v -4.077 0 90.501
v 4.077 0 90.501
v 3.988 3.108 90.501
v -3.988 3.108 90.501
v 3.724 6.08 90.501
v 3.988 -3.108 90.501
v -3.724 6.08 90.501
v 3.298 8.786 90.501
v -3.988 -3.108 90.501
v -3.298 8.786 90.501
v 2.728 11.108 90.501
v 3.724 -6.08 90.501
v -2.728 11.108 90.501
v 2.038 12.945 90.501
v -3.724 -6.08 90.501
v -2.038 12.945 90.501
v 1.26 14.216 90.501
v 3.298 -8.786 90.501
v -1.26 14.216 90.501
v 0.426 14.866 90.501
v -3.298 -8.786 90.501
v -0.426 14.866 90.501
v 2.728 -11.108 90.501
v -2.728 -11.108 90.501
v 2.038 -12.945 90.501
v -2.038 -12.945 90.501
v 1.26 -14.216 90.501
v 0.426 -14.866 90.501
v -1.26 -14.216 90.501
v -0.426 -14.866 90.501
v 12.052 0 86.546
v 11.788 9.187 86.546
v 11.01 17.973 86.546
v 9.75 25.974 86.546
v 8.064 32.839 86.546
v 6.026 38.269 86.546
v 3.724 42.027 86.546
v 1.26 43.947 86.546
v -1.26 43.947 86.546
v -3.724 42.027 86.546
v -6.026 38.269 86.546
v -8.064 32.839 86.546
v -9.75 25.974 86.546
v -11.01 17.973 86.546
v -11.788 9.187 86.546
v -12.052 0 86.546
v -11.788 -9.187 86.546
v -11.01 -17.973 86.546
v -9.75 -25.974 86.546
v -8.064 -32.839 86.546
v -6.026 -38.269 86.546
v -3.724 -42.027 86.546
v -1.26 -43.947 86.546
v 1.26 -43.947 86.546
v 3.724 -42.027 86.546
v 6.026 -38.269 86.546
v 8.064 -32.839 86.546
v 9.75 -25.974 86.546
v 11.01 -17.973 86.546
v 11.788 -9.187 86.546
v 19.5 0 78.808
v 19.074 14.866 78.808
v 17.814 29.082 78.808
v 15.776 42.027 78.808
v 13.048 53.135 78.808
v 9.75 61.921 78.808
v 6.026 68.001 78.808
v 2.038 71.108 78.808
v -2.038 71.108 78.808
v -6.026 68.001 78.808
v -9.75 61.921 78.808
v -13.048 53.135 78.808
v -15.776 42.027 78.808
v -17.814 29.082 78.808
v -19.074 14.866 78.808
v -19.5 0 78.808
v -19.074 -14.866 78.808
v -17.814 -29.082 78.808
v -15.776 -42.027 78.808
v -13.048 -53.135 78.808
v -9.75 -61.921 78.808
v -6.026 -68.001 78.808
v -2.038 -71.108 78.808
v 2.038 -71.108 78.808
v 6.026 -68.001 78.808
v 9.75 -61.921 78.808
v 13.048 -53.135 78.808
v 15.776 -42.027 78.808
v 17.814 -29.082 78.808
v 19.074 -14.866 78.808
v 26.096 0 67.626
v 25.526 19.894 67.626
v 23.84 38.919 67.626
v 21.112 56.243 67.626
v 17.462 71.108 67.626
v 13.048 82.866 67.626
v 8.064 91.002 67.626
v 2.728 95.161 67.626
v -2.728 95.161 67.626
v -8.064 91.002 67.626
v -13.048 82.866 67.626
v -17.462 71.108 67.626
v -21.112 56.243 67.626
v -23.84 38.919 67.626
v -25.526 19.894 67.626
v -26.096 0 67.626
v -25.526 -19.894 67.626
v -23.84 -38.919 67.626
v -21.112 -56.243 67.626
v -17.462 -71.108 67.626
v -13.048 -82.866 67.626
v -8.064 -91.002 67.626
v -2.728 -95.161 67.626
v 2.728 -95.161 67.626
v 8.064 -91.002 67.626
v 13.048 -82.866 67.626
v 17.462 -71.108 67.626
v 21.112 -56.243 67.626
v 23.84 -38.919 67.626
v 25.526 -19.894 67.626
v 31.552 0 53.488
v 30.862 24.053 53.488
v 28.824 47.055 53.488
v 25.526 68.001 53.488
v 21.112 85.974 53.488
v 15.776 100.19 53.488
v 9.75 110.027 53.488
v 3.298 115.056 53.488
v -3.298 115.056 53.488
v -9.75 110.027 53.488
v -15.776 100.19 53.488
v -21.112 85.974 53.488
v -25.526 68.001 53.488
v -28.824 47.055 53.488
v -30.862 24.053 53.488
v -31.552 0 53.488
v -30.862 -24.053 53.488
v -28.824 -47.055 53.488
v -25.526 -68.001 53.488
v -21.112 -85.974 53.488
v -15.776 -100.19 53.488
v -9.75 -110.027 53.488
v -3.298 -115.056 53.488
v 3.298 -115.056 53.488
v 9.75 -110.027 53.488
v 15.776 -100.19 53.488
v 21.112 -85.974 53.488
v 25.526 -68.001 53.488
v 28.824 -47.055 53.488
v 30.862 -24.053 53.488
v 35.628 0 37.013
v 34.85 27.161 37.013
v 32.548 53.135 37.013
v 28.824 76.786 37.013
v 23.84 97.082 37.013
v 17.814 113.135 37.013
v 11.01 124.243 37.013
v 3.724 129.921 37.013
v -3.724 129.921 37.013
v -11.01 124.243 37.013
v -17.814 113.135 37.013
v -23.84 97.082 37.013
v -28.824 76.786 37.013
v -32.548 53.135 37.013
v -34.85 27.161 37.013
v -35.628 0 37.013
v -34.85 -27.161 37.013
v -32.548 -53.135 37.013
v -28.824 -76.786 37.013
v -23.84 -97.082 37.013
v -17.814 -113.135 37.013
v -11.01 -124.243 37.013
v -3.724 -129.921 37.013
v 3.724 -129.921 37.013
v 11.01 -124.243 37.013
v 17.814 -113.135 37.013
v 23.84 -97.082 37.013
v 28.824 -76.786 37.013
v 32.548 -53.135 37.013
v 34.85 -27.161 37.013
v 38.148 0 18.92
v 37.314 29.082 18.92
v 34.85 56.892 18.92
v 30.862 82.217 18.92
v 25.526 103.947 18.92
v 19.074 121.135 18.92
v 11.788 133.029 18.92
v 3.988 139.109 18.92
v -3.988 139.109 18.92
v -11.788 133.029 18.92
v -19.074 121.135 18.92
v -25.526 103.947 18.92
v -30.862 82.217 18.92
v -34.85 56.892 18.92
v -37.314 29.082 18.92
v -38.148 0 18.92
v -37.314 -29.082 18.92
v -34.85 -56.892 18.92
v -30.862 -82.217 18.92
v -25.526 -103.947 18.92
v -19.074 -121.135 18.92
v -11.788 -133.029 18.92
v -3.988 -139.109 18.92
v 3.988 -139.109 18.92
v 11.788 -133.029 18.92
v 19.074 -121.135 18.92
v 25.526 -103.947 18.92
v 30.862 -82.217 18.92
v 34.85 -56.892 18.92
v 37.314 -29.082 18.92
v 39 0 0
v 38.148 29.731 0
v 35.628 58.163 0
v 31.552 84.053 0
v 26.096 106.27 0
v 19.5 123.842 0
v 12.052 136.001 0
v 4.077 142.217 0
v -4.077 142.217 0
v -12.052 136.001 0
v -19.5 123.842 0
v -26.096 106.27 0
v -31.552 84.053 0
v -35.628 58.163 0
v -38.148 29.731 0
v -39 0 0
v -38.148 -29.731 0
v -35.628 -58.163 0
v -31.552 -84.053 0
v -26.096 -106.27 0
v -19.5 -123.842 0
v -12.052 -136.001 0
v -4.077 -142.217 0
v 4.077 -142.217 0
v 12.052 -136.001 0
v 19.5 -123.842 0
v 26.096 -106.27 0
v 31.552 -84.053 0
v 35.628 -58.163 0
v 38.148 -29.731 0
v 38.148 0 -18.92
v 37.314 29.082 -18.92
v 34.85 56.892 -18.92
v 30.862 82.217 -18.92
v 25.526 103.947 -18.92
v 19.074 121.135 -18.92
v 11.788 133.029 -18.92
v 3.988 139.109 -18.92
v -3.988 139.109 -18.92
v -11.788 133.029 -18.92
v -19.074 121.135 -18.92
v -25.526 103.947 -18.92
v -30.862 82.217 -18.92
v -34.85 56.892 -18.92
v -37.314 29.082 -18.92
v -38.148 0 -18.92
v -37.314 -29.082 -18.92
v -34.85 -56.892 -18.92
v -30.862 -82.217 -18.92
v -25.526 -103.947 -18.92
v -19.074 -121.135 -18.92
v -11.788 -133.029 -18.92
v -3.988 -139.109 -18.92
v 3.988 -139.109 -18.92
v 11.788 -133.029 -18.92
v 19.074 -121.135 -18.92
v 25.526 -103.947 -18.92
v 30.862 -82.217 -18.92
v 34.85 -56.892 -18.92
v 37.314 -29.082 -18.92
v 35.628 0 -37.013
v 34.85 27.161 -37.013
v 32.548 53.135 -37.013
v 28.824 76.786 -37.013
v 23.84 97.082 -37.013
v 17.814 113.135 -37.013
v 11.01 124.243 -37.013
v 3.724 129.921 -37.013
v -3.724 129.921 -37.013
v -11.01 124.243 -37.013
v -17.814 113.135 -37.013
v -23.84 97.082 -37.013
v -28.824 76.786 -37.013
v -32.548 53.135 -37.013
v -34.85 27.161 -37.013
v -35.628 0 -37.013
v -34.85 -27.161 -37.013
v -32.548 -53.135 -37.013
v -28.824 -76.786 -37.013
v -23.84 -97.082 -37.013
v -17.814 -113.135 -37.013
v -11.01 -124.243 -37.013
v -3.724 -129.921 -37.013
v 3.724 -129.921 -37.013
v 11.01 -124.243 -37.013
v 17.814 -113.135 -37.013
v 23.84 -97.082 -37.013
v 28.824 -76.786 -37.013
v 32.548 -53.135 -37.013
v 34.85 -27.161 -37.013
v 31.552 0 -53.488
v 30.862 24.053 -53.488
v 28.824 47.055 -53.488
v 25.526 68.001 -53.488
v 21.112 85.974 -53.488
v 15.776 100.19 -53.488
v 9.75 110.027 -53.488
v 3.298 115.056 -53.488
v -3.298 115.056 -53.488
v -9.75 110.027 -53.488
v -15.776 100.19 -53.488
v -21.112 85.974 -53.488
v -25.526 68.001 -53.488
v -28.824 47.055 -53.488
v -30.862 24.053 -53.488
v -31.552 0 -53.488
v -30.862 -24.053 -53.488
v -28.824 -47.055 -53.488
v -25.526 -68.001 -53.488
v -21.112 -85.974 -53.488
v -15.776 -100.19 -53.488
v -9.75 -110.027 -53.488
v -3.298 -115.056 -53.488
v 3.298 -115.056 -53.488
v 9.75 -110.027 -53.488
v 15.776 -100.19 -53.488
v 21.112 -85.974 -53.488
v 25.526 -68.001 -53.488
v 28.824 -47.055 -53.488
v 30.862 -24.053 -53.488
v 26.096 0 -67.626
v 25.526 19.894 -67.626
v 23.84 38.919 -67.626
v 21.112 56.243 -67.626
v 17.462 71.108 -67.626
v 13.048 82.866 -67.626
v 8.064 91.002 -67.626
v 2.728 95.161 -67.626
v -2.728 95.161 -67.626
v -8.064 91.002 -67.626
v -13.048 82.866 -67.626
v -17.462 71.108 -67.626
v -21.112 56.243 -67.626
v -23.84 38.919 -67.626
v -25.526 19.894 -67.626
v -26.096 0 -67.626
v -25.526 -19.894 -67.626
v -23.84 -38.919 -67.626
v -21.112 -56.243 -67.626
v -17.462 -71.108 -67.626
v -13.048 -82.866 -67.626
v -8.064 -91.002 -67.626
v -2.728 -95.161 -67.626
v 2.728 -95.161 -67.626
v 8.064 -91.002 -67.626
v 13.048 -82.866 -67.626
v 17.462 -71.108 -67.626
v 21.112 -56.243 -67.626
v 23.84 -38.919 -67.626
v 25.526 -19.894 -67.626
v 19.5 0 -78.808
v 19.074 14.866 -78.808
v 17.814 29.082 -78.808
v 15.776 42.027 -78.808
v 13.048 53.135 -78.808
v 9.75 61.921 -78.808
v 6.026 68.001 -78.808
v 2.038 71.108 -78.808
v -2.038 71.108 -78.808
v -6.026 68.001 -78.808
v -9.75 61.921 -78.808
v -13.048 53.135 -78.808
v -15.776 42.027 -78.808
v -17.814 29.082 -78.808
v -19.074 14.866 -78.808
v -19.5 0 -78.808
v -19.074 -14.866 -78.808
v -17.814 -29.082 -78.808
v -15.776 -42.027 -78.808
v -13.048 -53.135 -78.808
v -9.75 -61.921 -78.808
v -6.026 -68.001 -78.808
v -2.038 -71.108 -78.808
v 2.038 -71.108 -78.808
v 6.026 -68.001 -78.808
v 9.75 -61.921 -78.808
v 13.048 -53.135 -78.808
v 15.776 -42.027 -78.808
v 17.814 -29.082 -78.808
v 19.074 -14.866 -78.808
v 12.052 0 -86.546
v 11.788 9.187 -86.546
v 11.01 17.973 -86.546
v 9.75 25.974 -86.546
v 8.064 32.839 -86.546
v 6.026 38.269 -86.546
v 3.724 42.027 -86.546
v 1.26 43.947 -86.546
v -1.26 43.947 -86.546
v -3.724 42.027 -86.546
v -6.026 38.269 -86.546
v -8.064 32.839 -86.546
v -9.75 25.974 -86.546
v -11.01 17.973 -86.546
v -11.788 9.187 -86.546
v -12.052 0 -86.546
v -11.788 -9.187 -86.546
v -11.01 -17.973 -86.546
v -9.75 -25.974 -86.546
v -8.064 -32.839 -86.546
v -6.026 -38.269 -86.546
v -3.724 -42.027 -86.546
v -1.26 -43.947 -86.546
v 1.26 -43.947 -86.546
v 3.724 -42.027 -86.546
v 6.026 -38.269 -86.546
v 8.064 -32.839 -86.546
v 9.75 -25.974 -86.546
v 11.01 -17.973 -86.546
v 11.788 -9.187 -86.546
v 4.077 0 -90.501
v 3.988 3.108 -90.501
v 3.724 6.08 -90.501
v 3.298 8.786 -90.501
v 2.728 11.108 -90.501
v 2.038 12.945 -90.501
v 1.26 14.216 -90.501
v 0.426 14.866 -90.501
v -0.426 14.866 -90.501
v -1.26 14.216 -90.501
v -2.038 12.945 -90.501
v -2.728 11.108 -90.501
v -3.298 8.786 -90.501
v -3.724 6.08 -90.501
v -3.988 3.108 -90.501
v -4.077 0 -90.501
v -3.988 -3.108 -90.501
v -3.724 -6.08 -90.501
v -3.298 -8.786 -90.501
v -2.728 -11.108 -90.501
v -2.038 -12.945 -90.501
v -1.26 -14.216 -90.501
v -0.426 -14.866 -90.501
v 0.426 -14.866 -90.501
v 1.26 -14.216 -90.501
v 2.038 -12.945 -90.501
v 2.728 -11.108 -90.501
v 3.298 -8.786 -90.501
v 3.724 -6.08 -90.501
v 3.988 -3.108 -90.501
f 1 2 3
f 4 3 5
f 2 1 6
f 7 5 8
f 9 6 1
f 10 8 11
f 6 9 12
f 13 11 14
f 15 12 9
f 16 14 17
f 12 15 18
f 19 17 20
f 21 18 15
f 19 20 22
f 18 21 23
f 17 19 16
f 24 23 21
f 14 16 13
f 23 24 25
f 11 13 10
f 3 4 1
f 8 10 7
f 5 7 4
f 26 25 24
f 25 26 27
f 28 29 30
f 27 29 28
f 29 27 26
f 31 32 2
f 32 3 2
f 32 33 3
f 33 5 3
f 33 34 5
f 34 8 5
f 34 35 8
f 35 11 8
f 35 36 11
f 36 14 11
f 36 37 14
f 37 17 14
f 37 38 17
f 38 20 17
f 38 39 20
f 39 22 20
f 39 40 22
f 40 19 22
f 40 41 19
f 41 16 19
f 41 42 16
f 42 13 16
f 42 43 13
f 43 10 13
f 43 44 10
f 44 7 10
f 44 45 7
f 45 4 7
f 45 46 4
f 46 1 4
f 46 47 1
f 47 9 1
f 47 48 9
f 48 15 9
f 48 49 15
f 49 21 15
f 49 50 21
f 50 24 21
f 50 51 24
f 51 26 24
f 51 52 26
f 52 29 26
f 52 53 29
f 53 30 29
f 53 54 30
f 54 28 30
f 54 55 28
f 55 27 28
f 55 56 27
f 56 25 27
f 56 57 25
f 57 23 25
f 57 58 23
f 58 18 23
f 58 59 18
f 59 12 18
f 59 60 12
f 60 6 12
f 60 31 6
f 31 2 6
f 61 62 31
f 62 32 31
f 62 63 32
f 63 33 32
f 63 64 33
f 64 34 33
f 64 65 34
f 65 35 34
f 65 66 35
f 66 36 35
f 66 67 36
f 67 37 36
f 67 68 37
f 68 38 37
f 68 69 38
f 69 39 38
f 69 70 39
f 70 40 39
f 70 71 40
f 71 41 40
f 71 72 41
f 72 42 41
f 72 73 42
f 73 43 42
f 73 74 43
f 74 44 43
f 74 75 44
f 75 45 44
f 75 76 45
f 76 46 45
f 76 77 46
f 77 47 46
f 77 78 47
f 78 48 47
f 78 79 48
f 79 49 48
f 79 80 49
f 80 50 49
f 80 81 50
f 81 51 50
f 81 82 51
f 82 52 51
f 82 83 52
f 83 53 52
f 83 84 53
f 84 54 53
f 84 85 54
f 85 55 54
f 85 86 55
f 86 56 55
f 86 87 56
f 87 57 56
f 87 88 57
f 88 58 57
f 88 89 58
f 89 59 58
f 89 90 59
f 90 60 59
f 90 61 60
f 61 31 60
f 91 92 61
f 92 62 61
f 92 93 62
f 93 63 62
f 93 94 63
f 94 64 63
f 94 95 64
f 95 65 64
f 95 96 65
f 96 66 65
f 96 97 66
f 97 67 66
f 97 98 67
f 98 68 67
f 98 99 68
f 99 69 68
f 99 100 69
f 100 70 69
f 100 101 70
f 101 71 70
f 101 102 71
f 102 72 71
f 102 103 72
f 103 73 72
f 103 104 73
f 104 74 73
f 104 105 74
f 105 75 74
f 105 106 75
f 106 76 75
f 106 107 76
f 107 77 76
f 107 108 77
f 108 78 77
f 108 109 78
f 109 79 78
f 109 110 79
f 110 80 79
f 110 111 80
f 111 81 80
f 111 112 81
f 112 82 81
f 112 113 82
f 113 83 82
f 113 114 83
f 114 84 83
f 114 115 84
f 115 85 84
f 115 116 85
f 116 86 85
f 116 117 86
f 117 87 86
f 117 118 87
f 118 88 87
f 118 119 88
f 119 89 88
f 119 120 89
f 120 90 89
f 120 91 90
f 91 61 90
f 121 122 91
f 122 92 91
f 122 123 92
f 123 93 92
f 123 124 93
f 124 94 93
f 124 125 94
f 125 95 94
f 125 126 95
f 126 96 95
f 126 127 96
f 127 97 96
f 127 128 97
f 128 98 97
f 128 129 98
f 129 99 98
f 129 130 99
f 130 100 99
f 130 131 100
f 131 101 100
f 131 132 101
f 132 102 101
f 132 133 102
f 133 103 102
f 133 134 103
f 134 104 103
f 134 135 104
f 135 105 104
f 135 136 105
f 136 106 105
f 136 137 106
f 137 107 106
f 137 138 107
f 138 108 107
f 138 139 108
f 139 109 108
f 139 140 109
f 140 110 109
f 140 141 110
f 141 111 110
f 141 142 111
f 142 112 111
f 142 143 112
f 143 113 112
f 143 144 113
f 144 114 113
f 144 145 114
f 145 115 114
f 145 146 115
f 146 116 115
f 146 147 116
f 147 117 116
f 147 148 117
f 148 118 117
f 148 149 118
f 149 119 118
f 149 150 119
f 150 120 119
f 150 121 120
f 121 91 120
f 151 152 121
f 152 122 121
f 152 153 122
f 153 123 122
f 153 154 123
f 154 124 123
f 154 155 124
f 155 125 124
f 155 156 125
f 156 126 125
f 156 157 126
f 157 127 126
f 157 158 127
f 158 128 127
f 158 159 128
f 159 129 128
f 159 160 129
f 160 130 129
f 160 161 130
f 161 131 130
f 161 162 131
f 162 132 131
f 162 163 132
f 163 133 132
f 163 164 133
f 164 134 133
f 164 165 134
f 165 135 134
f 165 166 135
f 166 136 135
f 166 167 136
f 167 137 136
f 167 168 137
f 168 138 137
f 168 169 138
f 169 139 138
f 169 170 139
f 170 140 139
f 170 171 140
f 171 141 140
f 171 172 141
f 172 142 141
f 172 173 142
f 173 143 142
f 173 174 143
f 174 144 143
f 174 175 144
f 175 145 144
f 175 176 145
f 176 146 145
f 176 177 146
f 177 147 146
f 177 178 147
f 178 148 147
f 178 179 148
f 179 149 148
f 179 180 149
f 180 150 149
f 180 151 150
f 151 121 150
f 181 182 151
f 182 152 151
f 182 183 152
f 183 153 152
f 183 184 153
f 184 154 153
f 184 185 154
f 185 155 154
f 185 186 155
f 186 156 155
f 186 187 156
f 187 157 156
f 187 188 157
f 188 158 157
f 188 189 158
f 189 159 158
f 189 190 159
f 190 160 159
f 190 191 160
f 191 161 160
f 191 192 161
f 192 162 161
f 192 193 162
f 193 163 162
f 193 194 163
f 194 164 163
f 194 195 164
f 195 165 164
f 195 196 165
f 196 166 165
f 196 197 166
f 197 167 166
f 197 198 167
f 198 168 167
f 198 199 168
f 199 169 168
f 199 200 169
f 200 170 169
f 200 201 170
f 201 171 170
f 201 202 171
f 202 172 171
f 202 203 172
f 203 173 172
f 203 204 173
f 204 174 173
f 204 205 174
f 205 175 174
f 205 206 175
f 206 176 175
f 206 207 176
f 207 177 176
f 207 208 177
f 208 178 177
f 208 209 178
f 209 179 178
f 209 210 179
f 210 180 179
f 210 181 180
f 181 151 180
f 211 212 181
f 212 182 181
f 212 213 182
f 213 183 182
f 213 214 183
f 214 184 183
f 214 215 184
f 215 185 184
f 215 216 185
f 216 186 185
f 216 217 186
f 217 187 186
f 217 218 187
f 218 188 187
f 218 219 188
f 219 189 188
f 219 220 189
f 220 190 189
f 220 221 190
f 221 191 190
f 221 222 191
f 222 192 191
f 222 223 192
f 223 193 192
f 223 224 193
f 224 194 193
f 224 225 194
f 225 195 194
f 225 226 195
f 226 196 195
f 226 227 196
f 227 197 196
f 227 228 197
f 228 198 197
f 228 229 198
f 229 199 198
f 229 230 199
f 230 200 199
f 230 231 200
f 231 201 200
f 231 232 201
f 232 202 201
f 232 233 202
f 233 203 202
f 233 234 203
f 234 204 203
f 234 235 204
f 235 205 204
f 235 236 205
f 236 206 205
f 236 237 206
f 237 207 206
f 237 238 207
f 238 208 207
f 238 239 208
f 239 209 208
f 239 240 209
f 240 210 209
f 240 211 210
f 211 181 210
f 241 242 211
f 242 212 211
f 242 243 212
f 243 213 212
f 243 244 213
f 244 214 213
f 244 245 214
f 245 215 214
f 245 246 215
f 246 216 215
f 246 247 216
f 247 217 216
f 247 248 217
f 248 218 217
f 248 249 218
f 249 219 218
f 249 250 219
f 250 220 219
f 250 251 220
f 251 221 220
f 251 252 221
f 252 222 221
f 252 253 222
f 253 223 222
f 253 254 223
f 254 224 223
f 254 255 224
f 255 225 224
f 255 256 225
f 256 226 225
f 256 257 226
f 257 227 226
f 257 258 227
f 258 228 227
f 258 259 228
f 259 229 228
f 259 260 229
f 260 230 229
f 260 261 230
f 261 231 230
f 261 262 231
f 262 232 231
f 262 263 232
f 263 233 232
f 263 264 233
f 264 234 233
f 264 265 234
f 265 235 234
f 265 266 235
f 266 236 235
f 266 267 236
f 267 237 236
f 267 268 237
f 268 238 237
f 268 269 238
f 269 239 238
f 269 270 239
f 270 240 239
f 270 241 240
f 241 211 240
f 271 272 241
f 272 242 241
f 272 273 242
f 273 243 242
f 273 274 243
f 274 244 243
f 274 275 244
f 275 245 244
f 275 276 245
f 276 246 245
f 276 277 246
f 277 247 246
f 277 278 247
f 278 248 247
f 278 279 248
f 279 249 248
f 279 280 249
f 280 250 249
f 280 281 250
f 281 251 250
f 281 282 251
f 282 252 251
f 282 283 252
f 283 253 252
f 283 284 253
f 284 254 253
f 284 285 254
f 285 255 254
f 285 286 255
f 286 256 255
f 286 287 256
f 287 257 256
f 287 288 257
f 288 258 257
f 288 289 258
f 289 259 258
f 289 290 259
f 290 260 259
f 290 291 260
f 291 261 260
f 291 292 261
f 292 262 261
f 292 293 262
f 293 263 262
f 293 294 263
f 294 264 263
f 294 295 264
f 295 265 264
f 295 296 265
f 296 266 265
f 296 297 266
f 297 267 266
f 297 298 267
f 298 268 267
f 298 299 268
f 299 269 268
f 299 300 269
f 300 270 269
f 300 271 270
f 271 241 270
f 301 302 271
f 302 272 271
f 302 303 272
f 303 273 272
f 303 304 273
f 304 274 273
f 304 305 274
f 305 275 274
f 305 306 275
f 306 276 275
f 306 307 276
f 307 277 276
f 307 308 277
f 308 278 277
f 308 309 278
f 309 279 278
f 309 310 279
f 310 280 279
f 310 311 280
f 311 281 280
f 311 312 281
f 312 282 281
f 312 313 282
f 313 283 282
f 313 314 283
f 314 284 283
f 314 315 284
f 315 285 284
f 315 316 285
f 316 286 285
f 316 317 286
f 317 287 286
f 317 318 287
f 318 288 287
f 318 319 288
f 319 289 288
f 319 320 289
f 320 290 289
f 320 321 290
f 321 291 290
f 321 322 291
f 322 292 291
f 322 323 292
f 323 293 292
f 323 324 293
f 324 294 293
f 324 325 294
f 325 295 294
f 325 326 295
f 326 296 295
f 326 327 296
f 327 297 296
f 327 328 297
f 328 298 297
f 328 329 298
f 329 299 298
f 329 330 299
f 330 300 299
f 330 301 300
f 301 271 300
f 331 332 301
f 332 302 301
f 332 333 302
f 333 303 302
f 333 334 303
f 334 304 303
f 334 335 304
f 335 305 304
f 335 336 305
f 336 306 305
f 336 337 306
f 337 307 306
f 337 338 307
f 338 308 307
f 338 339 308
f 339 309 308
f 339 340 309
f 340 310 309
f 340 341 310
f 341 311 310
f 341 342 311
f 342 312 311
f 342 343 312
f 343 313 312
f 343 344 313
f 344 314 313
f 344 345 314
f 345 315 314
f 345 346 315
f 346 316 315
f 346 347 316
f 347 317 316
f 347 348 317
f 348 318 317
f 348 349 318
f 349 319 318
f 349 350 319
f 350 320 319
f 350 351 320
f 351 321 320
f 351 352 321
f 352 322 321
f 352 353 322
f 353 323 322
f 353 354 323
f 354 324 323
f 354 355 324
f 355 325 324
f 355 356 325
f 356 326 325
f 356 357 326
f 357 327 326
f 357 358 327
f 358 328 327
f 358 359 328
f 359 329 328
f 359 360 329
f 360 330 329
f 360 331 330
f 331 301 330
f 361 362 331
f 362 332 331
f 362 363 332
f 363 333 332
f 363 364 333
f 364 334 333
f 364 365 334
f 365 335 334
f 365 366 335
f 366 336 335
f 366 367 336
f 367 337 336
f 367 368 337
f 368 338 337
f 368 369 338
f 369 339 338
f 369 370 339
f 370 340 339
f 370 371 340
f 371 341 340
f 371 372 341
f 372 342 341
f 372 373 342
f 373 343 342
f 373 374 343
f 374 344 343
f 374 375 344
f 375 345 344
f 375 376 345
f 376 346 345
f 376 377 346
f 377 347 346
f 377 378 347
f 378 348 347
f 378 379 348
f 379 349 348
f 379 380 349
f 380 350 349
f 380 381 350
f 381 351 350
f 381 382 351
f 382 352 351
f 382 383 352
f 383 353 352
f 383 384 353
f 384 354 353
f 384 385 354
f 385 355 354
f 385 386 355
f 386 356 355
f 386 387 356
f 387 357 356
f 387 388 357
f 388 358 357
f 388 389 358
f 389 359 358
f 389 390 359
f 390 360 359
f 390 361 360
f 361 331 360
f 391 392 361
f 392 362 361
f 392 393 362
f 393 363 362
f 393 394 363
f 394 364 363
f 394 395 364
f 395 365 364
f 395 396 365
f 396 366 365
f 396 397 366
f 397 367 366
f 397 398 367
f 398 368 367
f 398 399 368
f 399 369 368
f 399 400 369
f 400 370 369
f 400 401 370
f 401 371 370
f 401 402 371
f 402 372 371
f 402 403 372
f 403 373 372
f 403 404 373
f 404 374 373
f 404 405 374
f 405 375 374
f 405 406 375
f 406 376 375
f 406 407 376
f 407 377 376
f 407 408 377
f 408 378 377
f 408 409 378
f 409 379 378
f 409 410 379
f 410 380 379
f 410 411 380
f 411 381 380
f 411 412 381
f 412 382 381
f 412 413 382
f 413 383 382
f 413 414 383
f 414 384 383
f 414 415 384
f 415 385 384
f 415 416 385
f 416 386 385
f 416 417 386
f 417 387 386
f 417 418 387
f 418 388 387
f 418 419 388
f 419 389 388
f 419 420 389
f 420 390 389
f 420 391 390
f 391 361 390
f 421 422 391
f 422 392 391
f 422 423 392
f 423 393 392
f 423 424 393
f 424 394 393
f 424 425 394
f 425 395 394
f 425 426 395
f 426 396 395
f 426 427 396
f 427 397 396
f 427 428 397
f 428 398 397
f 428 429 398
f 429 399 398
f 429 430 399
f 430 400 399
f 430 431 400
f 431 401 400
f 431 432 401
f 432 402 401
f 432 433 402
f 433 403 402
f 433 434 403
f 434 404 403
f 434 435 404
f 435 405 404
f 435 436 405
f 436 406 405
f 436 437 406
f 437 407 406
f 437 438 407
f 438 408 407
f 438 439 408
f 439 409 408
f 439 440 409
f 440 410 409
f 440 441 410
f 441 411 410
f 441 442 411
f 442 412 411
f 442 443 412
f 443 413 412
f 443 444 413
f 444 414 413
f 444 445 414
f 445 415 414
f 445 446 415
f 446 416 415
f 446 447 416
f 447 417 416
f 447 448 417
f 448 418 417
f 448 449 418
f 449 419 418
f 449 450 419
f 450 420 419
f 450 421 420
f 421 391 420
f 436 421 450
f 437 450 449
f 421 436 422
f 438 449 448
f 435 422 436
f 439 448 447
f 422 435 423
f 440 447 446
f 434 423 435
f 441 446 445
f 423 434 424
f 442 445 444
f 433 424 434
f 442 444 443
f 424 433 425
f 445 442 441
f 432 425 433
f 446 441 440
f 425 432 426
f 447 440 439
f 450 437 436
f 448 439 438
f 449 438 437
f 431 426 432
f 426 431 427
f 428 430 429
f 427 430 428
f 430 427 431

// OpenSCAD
// Generated by SolidPython 1.0.1 on 2020-07-29 00:46:45


scale(v = [3, 11, 7]) {
	sphere(r = 13);
}
/***********************************************
*********      SolidPython code:      **********
************************************************
 
# import packages: SolidPython
from solid import *
from solid.utils import *
from itertools import chain, combinations, permutations


class Resize:

    def __init__(self, scad_file):
        self.scad_file = scad_file
        #self.scad_file = import_scad(scad_file)
        # cone/cylinder param:
        self.r1 = 0
        self.r2 = 0
        self.h = 0
        # rectangular prism param:
        self.w = 0
        self.l = 0
        # ellipse param:
        self.r = 0

    # import OpenScad code (file name corresponds to shape)


    # classify shape + parameters
    def assign(self, param1, param2, param3):
        if self.scad_file == 'cone.scad':
            self.r1 = param1
            self.r2 = param2
            self.h = param3
        elif self.scad_file == 'cylinder.scad':
            self.r1 = param1
            self.r2 = param2
            self.h = param3
        elif self.scad_file == 'rectangularPrism.scad':
            self.h = param1
            self.l = param2
            self.w = param3
        else:
            self.r = param1
            self.h = param2

    # resize parameters
    def iterate(self):
        x = range(3, 20, 2)
        i = 1
        if self.scad_file == 'cone.scad':
            tempList = list(permutations(x, 2))
            for temp in tempList:
                param1 = temp[0]
                param2 = temp[1]
                filepath = 'produced_scad_files/' + 'cone' + str(param1) + '_' + str(param2) + '_' + '.scad'
                scad_render_to_file(cylinder(h=param1, r1=param2, r2=0), filepath)

        elif self.scad_file == 'cylinder.scad':
            tempList = list(permutations(x, 3))
            for temp in tempList:
                param1 = temp[0]
                param2 = temp[1]
                filepath = 'produced_scad_files/' + 'cylinder' + str(param1) + '_' + str(param2) + '_' + '.scad'
                scad_render_to_file(cylinder(h=param1, r1=param2, r2=param2), filepath)

        elif self.scad_file == 'rectangularPrism.scad':
            tempList = list(permutations(x, 3))
            for temp in tempList:
                param1 = temp[0]
                param2 = temp[1]
                param3 = temp[2]
                filepath = 'produced_scad_files/' + 'rectangularPrism' + str(param1) + '_' + str(param2) + '_' + str(
                    param3) + '.scad'
                scad_render_to_file(cube(size=(param1, param2, param3)), filepath)

        elif self.scad_file == 'ellipse.scad':
            tempList = list(permutations(x, 4))
            for temp in tempList:
                param1 = temp[0]
                param2 = temp[1]
                param3 = temp[2]
                param4 = temp[3]
                filepath = 'produced_scad_files/' + 'ellipse' + str(param1) + '_' + str(param2) + '_' + str(param3) + '_' + str(param4) + '.scad'
                scad_render_to_file(scale([param1, param2, param3])(sphere(r=param4)), filepath)

    def render_to_scadfile(self):
        scad_render_to_file(scad, 'example.scad') 
 
************************************************/
